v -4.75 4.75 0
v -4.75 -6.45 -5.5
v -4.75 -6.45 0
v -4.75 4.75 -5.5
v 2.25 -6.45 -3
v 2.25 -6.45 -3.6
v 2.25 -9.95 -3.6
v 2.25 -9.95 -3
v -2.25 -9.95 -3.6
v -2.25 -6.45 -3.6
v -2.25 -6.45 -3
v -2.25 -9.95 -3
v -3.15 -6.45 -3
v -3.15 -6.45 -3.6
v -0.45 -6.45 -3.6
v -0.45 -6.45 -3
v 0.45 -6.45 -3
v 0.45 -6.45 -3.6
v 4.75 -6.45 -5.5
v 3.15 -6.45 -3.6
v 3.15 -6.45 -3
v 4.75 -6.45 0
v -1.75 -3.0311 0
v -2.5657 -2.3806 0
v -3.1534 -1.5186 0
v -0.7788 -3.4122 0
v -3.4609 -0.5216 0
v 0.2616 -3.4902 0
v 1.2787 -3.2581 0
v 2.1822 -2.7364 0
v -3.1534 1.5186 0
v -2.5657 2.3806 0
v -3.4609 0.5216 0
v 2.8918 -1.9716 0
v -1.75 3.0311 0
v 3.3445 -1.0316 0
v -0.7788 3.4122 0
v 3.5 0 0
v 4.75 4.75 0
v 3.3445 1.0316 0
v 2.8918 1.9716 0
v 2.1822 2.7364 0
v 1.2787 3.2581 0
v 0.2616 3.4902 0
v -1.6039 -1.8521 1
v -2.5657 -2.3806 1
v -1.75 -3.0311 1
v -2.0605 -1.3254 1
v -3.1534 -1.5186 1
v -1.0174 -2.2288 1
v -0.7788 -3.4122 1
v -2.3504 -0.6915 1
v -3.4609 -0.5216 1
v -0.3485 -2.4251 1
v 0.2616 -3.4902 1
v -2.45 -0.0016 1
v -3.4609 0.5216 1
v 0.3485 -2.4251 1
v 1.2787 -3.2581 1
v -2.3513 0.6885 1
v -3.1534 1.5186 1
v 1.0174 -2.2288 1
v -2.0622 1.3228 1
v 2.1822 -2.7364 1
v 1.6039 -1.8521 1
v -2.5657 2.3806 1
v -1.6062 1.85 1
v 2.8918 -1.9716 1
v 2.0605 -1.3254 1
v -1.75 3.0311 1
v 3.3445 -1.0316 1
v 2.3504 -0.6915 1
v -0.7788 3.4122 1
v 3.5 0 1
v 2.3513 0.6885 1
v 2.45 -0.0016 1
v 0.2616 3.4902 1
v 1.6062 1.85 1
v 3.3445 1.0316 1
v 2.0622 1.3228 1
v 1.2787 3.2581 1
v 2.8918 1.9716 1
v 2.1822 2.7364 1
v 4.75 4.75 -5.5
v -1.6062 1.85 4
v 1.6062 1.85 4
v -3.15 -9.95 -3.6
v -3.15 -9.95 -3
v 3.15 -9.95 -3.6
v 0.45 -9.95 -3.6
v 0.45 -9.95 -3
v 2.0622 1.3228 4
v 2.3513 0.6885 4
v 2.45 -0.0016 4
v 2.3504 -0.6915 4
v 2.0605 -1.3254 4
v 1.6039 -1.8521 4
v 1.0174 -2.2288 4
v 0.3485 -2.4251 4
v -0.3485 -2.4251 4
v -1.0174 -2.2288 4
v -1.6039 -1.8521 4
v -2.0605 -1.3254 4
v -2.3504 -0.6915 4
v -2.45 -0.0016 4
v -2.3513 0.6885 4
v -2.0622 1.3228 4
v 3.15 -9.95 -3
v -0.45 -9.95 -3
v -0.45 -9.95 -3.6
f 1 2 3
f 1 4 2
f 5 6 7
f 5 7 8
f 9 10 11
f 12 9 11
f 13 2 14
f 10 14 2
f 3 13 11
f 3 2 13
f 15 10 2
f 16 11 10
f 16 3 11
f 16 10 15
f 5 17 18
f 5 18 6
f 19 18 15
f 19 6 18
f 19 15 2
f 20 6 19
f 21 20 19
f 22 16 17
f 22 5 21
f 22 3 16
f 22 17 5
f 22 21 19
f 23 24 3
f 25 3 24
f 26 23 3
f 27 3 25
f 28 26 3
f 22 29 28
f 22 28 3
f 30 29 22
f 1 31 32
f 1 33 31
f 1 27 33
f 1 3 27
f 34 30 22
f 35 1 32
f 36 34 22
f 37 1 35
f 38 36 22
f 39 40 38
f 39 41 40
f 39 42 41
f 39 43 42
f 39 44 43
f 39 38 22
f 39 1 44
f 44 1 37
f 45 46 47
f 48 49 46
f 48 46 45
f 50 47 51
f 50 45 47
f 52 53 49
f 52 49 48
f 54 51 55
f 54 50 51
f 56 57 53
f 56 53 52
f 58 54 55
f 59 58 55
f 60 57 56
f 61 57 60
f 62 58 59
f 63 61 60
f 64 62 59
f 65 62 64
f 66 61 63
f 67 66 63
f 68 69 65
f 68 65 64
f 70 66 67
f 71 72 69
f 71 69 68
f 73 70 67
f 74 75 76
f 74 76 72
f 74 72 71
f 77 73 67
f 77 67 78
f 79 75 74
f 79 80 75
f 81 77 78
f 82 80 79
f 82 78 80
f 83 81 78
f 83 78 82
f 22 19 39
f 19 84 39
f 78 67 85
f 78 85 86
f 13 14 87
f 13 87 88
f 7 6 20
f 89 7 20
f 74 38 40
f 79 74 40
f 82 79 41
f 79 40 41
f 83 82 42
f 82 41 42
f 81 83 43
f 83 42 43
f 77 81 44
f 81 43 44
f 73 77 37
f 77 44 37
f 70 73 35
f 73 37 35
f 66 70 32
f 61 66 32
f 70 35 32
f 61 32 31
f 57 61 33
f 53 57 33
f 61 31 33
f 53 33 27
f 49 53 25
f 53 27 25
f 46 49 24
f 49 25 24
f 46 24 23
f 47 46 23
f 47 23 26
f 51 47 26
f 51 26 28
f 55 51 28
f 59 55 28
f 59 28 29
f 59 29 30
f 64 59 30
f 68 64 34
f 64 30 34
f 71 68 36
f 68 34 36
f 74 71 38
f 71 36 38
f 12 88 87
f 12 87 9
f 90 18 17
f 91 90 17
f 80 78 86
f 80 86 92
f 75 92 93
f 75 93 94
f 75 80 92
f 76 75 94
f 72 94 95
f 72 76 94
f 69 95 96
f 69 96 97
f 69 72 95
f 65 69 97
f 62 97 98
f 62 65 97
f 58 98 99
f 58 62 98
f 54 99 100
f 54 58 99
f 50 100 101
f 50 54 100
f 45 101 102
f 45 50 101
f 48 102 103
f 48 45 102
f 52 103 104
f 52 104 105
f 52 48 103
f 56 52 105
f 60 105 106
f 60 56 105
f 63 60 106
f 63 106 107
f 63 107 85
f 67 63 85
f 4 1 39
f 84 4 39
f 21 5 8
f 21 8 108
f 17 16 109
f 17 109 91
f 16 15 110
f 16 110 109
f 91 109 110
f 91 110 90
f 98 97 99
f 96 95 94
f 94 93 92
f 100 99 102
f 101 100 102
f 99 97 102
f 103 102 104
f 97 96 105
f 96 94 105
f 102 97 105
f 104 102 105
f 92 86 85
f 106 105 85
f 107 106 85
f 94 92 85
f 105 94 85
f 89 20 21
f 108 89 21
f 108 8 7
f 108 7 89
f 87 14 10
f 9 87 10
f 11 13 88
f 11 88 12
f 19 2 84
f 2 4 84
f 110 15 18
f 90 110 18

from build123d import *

# Parameters (mm, degrees)
SKETCH1_W           = 9.5
SKETCH1_H           = 9.5
BOSS_EXTRUDE1_DEPTH = 5.5
SKETCH2_W           = 9.5
SKETCH2_H           = 5.5
BOSS_EXTRUDE2_DEPTH = 1.7
SKETCH3_R           = 3.5
BOSS_EXTRUDE3_DEPTH = 1
BOSS_EXTRUDE4_DEPTH = 3
SKETCH5_W           = 0.9
SKETCH5_H           = 0.6
BOSS_EXTRUDE5_DEPTH = 3.5


with BuildPart() as part:
    # Sketch1 → Boss-Extrude1 (new body)
    with BuildSketch(Plane.XY):
        Rectangle(SKETCH1_W, SKETCH1_H)
    extrude(amount=-BOSS_EXTRUDE1_DEPTH)

    # Sketch2 → Boss-Extrude2 (add)
    with BuildSketch(Plane.XZ.offset(4.75)):
        with Locations((0, -2.75)):
            Rectangle(SKETCH2_W, SKETCH2_H)
    extrude(amount=BOSS_EXTRUDE2_DEPTH)

    # Sketch3 → Boss-Extrude3 (add)
    with BuildSketch(Plane.XY):
        Circle(SKETCH3_R)
    extrude(amount=BOSS_EXTRUDE3_DEPTH)

    # Sketch4 → Boss-Extrude4 (add)
    with BuildSketch(Plane.XY.offset(1)):
        with BuildLine():
            Line((-1.60623784, 1.85), (1.60623784, 1.85))
            ThreePointArc((1.60623784, 1.85), (0, -2.45), (-1.60623784, 1.85))
        make_face()
    extrude(amount=BOSS_EXTRUDE4_DEPTH)

    # Sketch5 → Boss-Extrude5 (add)
    with BuildSketch(Plane.XZ.offset(6.45)):
        with Locations((-2.7, -3.3)):
            Rectangle(SKETCH5_W, SKETCH5_H)
        with Locations((0, -3.3)):
            Rectangle(SKETCH5_W, SKETCH5_H)
        with Locations((2.7, -3.3)):
            Rectangle(SKETCH5_W, SKETCH5_H)
    extrude(amount=BOSS_EXTRUDE5_DEPTH)


solid = part.part
